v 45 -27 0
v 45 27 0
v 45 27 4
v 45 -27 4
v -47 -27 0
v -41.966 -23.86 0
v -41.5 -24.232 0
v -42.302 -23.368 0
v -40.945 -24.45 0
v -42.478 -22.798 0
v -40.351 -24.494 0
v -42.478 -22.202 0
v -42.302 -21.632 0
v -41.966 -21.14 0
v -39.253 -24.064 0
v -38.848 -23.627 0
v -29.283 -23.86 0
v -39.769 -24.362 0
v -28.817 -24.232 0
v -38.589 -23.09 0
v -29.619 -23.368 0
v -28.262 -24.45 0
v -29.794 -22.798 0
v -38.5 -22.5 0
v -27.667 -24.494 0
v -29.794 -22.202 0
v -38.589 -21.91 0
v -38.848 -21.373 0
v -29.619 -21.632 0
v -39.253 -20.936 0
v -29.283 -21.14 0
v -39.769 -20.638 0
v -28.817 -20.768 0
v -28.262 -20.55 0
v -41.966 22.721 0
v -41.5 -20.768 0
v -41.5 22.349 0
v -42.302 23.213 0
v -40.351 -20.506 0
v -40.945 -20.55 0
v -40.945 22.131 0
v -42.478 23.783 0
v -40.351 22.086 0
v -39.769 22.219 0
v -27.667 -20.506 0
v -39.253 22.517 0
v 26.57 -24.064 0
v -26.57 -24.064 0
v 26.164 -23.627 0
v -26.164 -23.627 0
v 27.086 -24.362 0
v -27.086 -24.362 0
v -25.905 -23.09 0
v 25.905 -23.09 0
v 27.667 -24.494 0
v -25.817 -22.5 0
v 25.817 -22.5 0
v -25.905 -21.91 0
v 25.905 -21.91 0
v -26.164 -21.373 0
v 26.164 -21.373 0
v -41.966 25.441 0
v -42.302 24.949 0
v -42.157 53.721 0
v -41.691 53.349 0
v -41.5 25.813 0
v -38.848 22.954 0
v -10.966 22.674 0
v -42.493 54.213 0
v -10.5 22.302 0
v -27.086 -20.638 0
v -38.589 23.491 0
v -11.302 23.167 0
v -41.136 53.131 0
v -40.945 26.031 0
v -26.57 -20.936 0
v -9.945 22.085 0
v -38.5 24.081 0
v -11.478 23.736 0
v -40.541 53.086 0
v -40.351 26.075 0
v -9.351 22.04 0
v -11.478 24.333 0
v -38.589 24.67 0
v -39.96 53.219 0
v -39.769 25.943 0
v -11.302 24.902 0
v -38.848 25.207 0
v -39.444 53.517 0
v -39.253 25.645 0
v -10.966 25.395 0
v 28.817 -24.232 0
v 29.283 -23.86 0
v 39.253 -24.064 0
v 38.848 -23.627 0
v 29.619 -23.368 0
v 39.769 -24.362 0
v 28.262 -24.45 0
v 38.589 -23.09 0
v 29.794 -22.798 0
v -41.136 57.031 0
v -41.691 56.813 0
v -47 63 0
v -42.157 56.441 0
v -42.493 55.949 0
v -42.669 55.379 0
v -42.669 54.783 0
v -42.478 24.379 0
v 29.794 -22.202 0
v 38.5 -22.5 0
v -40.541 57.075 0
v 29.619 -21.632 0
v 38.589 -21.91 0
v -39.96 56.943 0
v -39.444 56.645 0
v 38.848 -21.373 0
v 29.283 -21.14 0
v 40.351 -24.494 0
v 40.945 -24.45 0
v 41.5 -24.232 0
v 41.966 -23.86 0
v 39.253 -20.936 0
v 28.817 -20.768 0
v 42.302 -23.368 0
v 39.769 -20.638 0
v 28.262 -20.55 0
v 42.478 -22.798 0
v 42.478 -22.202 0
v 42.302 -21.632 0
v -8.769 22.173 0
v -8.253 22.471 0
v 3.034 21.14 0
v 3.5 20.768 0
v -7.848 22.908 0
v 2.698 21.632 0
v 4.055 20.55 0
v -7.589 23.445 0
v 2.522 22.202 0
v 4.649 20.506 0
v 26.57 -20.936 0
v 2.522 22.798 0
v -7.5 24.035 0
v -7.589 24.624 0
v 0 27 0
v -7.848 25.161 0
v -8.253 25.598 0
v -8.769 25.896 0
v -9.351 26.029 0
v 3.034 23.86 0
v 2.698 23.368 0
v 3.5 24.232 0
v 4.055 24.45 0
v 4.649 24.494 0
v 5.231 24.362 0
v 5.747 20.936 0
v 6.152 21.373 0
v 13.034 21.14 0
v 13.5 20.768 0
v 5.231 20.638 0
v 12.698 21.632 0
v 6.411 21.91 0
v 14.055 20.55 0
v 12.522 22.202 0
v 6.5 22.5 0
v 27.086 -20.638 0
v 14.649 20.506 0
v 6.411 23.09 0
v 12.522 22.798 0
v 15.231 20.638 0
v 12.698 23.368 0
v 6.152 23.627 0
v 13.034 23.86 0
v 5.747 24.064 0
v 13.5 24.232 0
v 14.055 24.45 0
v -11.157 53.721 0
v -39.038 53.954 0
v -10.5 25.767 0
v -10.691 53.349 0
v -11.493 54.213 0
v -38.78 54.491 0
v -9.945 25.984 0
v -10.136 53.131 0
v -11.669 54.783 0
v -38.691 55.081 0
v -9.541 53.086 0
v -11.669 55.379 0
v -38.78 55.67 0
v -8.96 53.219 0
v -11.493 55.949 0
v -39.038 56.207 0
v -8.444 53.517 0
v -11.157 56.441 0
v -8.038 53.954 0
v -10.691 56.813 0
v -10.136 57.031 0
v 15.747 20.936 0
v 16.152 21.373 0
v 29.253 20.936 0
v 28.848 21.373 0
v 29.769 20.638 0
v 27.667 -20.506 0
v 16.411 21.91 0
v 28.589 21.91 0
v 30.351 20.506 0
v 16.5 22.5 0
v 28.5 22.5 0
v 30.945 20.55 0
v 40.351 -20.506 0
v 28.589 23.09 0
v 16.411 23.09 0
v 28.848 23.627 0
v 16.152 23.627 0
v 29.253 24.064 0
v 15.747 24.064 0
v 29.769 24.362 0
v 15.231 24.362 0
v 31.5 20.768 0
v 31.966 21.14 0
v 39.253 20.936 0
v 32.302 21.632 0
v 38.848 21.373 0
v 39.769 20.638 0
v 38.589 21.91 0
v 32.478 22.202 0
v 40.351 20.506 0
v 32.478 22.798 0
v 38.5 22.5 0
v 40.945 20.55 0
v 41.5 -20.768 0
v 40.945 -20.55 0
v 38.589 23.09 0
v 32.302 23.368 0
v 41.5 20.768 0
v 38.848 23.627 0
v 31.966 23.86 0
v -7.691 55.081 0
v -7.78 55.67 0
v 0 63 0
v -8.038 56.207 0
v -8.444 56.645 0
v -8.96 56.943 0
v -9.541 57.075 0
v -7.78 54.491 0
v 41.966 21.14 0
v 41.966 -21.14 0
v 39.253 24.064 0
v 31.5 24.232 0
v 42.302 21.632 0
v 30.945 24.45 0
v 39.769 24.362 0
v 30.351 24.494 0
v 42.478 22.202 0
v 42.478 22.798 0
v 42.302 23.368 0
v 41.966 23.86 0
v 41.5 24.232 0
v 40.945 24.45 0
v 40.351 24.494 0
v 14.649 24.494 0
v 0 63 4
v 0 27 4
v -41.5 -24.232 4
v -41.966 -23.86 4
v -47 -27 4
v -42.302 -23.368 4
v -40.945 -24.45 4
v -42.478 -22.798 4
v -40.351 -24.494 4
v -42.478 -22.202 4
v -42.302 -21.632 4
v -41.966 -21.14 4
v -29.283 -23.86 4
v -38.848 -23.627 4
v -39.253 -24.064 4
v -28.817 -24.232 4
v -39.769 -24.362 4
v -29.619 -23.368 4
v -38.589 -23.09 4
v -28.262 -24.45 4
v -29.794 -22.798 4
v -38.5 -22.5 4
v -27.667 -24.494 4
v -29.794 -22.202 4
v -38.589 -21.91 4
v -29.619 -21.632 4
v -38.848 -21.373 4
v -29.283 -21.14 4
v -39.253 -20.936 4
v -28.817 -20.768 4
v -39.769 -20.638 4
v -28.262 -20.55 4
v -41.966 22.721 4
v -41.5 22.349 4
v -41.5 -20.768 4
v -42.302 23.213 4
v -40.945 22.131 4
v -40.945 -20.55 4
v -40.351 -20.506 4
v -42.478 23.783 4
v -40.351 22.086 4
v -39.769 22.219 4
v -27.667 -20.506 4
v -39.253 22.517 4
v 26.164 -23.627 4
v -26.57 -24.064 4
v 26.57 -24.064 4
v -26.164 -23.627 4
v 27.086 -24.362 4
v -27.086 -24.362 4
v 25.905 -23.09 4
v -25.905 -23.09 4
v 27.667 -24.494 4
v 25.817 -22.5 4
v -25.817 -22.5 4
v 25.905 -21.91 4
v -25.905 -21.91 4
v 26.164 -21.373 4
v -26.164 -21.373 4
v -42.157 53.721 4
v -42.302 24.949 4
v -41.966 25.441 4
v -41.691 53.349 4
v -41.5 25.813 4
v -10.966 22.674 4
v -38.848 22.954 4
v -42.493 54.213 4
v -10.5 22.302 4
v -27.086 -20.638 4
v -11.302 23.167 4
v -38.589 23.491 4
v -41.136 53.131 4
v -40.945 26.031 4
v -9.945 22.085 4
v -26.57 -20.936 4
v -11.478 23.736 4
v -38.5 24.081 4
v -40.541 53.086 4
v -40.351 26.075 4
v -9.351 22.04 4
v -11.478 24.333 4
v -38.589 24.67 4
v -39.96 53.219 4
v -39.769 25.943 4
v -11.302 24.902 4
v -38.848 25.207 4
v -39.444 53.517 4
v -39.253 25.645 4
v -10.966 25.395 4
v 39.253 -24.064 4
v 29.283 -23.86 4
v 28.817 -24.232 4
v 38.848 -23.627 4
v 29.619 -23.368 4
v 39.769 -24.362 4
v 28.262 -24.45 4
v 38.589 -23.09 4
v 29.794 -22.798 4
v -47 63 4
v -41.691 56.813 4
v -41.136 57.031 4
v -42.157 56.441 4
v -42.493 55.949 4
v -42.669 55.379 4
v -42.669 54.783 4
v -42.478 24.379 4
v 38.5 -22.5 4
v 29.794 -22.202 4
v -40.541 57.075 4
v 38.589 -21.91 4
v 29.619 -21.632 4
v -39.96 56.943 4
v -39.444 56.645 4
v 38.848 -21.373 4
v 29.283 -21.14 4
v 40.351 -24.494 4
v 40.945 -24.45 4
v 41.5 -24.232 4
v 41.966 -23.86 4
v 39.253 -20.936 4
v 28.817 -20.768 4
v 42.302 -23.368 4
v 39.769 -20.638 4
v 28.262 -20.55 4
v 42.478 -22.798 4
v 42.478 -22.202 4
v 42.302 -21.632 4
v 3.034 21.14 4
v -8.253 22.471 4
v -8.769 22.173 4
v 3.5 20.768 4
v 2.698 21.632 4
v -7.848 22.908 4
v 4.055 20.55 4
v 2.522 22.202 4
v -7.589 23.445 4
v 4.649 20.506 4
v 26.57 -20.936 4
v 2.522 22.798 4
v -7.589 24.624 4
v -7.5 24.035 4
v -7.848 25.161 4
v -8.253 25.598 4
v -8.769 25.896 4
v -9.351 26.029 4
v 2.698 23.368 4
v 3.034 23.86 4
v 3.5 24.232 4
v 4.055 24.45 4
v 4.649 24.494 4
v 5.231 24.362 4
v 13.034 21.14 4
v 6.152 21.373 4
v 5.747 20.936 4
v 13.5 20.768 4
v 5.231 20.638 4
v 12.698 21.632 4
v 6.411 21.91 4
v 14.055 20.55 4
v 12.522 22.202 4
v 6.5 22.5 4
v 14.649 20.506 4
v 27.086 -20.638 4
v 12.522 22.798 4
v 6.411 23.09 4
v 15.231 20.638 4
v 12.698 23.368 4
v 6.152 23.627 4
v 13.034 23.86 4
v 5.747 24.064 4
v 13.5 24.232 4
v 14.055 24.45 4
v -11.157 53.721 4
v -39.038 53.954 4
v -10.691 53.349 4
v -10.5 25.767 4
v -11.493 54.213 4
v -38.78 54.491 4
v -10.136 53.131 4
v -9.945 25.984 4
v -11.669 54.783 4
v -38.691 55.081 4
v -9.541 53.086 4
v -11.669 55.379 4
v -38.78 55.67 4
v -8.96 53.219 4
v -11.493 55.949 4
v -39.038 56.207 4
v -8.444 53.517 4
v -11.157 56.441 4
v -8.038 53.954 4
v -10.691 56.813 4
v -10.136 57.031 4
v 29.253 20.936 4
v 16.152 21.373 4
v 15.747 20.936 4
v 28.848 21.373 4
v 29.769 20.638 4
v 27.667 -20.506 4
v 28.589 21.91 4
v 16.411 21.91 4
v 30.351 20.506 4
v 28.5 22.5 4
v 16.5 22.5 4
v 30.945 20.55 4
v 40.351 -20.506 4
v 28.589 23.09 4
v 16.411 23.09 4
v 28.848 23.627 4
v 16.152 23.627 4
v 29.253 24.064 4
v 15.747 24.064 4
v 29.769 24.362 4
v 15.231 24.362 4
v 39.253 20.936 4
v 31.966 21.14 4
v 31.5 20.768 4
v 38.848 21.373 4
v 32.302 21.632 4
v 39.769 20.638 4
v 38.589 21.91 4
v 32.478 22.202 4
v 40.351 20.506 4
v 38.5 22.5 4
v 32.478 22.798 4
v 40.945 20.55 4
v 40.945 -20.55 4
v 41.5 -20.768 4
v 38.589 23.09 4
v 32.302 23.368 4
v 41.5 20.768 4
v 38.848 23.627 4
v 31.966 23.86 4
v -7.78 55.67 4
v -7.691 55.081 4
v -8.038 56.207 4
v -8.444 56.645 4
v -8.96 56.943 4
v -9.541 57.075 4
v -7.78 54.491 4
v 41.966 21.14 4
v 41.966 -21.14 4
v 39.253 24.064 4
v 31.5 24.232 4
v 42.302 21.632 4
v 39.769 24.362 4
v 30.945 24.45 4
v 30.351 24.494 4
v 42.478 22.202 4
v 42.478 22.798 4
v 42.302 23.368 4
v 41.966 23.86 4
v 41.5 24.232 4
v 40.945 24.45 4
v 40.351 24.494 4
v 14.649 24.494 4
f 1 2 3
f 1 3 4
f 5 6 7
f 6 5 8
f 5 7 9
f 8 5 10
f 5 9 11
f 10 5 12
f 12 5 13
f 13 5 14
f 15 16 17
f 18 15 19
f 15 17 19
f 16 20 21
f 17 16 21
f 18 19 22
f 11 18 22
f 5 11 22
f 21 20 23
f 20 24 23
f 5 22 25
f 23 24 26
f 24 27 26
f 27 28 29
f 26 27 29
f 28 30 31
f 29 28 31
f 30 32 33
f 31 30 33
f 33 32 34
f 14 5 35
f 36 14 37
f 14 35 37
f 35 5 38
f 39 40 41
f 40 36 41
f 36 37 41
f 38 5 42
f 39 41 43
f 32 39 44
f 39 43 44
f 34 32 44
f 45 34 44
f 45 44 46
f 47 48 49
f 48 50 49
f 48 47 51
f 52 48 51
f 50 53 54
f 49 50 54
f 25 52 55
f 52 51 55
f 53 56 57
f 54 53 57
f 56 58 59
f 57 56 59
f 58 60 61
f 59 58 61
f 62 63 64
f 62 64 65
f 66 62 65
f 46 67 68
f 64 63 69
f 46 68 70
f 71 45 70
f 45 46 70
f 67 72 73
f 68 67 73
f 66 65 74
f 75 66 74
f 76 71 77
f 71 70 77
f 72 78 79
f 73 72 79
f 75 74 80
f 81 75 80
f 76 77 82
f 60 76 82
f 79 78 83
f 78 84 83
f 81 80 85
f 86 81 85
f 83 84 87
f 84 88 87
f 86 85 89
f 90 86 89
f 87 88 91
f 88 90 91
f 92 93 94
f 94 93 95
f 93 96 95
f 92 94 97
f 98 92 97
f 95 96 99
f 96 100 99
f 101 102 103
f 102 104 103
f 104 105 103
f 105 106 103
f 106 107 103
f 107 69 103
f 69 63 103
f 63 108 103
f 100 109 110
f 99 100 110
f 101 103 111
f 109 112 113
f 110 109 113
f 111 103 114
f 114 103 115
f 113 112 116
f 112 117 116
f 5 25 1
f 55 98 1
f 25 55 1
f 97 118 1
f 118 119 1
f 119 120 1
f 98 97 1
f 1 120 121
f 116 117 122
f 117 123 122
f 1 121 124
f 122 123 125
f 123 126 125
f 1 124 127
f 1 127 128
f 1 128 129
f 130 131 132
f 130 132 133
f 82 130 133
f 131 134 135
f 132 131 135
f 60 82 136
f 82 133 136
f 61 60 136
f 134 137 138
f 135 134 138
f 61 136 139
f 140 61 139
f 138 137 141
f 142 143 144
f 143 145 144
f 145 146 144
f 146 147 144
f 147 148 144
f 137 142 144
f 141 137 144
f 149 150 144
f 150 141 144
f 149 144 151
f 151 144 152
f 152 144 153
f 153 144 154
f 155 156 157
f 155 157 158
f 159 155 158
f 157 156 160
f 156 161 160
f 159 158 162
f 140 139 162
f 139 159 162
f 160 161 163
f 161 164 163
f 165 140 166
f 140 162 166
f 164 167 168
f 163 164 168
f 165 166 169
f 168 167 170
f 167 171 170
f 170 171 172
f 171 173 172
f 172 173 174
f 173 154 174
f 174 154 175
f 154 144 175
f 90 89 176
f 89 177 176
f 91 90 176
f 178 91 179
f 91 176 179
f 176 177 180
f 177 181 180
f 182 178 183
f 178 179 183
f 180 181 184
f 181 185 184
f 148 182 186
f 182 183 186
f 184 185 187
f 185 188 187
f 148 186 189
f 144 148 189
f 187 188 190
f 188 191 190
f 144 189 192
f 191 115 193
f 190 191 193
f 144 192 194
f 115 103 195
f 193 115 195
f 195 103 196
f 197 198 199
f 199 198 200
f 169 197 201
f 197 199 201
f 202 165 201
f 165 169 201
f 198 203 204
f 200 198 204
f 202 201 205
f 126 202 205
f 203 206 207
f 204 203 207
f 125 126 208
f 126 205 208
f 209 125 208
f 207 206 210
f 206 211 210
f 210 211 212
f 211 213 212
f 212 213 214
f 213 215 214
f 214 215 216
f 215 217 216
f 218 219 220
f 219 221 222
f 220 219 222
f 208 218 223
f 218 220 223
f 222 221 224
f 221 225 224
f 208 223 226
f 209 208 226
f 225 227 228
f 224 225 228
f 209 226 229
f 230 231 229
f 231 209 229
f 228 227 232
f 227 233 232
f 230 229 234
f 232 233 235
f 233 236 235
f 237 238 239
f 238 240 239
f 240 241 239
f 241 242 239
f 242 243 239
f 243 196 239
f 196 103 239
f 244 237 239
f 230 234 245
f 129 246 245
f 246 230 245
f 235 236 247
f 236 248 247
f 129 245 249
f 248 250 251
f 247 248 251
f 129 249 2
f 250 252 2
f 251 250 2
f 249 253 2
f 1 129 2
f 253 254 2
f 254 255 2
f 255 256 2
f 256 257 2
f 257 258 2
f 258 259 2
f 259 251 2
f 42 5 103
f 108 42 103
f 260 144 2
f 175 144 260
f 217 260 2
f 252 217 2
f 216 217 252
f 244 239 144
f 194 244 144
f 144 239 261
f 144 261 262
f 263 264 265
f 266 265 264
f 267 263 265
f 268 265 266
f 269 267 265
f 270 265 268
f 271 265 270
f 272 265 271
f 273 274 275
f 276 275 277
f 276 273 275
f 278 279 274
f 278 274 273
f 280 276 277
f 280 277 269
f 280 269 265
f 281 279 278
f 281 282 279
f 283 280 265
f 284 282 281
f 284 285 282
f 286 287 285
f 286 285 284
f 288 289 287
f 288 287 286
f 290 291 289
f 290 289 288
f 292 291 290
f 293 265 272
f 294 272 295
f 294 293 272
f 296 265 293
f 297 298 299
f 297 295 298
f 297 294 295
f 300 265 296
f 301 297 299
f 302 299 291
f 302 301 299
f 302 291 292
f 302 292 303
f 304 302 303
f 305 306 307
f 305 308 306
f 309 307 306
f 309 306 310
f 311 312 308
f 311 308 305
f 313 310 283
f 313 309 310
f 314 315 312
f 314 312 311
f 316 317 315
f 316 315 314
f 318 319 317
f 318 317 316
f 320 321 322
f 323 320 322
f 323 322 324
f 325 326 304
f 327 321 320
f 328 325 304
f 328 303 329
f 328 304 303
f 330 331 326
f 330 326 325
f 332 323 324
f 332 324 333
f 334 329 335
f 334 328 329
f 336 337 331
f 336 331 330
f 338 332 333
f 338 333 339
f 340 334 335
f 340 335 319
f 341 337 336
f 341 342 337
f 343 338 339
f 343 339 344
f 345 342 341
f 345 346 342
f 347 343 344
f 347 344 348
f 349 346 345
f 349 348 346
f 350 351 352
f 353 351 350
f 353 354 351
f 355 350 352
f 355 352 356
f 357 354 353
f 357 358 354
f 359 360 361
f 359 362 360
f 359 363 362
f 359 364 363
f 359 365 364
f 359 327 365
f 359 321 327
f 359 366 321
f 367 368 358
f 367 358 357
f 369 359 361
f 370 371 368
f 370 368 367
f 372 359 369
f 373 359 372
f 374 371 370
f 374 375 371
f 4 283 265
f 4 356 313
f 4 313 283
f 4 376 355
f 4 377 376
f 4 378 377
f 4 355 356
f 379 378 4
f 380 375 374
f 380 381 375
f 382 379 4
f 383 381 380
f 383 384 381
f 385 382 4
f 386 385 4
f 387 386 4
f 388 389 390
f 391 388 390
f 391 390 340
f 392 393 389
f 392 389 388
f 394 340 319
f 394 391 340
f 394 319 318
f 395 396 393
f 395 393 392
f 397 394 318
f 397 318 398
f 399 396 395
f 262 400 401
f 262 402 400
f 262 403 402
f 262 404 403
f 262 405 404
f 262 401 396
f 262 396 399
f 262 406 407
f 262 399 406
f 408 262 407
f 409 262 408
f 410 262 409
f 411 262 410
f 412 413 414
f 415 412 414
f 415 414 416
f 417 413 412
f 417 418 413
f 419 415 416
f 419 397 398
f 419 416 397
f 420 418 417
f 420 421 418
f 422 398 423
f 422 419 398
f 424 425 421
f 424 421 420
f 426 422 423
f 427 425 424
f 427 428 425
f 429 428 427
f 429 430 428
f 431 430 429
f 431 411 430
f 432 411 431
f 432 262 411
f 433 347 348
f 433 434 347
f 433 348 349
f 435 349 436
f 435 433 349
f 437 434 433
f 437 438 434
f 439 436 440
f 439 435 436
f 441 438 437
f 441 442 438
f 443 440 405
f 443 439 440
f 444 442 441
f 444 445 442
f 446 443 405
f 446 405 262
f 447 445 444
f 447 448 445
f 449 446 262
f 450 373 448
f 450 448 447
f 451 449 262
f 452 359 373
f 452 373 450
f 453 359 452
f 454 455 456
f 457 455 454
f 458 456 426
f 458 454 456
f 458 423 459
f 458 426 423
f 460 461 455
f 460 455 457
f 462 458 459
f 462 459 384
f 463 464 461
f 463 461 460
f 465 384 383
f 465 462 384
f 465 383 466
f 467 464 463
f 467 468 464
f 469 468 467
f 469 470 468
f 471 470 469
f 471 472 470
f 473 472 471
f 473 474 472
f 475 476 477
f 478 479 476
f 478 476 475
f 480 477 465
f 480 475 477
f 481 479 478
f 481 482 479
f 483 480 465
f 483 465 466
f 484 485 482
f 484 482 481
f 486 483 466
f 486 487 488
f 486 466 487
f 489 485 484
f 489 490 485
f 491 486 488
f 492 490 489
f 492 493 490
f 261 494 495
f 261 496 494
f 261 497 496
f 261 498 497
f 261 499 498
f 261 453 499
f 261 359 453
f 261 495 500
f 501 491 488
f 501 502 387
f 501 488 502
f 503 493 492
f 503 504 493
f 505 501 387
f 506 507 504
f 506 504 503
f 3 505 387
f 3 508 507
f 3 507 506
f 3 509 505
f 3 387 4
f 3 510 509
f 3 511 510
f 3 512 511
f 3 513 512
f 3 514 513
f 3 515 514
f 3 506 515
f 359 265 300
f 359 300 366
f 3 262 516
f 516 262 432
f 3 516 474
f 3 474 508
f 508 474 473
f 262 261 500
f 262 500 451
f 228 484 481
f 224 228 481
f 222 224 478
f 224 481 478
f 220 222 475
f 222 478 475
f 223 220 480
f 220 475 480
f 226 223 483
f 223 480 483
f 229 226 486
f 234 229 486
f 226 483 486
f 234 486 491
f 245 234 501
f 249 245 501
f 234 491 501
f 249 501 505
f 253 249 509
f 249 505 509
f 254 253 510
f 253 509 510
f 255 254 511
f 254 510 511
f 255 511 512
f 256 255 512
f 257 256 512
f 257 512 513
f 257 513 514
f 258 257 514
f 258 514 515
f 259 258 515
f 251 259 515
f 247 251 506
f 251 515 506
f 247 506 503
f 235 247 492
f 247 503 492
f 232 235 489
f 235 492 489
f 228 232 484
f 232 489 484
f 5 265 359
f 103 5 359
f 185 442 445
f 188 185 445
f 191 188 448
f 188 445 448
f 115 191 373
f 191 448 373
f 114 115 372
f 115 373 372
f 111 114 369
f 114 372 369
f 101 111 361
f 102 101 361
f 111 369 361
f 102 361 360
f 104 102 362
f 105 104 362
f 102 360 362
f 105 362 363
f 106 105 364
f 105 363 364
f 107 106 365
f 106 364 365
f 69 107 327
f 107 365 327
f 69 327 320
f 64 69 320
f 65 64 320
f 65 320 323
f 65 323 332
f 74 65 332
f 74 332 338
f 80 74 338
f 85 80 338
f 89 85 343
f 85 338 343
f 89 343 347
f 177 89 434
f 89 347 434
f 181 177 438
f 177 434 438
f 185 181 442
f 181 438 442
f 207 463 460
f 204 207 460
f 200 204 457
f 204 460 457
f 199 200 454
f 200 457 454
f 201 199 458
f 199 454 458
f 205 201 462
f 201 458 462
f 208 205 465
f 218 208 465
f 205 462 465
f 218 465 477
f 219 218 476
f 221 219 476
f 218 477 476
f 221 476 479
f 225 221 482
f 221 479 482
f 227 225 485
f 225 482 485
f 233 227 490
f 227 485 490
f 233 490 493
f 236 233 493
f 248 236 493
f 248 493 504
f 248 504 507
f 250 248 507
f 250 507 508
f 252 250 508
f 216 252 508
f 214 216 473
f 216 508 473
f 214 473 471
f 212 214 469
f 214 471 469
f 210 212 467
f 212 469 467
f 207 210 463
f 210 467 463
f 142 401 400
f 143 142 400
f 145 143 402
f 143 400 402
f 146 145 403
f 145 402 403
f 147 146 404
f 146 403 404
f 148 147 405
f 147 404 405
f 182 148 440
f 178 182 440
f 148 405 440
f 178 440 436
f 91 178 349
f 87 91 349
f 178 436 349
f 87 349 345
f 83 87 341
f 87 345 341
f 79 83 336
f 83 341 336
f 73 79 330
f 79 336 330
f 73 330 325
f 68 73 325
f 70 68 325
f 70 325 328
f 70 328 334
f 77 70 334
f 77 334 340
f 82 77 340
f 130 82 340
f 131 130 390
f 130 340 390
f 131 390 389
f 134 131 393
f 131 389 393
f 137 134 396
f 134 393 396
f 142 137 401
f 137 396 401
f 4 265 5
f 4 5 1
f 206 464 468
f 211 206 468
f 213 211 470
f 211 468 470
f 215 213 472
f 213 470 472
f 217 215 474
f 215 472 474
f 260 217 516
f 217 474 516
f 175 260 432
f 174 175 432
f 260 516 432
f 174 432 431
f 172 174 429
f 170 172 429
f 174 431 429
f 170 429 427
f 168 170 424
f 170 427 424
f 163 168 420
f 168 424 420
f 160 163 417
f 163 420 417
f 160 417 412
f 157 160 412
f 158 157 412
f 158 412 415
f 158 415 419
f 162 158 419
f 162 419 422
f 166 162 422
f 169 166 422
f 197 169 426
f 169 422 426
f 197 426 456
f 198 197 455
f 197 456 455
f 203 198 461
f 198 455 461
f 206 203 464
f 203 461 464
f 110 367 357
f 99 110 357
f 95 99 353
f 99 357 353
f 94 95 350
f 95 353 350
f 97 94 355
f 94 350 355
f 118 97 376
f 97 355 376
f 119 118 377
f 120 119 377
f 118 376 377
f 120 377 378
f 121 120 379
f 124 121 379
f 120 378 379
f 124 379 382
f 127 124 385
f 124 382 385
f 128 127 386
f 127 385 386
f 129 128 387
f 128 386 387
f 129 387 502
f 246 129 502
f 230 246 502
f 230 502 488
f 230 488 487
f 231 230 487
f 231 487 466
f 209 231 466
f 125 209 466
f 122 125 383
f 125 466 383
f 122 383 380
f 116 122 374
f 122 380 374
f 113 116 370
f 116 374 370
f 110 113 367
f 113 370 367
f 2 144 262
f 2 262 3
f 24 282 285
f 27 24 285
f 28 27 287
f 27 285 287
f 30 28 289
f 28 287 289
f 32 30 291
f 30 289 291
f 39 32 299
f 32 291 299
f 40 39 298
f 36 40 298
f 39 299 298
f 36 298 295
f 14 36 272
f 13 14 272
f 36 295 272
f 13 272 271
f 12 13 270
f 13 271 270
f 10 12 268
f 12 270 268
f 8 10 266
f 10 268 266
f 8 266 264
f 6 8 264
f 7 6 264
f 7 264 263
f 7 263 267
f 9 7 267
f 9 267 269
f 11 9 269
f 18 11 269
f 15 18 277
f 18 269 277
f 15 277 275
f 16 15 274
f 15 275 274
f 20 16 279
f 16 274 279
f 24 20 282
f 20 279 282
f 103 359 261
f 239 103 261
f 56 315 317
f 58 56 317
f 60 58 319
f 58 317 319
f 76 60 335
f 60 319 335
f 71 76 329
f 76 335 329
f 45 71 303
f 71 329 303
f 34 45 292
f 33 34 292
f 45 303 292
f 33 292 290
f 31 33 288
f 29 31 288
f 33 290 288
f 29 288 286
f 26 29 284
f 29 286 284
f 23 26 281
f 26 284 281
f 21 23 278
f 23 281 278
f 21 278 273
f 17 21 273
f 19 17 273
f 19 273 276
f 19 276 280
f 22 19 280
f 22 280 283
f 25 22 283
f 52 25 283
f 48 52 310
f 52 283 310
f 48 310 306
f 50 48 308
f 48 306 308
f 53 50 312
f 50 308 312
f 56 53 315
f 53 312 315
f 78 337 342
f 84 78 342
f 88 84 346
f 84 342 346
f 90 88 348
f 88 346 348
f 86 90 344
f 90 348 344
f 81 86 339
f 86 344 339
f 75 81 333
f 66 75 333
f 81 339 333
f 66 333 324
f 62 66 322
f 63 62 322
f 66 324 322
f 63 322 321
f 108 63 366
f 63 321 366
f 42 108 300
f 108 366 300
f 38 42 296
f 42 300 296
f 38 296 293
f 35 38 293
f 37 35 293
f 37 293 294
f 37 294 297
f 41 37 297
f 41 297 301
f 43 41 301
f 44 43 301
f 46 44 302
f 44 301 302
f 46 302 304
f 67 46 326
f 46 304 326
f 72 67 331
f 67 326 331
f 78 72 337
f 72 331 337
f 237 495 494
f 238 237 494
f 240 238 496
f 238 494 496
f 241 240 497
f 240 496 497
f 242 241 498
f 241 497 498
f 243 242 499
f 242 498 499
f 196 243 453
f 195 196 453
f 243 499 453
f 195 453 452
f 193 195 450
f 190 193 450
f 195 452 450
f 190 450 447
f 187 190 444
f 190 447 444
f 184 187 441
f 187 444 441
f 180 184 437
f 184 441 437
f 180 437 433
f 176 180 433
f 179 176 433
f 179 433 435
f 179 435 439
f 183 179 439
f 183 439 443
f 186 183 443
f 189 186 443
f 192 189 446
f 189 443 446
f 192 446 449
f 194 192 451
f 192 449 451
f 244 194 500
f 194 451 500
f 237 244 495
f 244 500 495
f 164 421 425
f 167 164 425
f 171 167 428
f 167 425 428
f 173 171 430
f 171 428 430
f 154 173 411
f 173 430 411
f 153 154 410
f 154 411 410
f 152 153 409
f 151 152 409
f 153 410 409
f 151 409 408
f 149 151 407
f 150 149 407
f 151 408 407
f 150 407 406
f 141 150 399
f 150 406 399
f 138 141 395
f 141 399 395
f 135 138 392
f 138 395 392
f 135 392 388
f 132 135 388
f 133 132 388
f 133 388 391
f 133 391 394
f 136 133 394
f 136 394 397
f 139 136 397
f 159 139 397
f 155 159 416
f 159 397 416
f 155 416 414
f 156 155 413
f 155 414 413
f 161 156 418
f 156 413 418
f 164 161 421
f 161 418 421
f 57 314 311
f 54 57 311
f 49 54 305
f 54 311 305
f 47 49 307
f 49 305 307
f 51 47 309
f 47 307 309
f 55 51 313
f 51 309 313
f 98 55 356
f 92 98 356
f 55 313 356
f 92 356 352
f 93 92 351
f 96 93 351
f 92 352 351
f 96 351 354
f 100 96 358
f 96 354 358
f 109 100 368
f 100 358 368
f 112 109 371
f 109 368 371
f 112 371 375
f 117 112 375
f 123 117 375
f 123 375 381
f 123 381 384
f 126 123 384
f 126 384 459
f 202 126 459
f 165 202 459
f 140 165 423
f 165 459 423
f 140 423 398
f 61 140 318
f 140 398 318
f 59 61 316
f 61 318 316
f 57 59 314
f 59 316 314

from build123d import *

# Parameters (mm, degrees)
BOSS_EXTRUDE1_DEPTH = 4
SKETCH2_R           = 2
CUT_EXTRUDE1_DEPTH  = 4
SKETCH3_R           = 2
CUT_EXTRUDE2_DEPTH  = 4
SKETCH4_R           = 2
CUT_EXTRUDE3_DEPTH  = 4
SKETCH5_W           = 2
SKETCH5_H           = 90
BOSS_EXTRUDE2_DEPTH = 4
SKETCH6_R           = 2
CUT_EXTRUDE4_DEPTH  = 4


with BuildPart() as part:
    # Sketch1 → Boss-Extrude1 (new body)
    with BuildSketch(Plane.XY):
        Polygon((-45, 27), (-45, 63), (0, 63), (0, 27), (45, 27), (45, -27), (-45, -27), align=None)
    extrude(amount=BOSS_EXTRUDE1_DEPTH)

    # Sketch2 → Cut-Extrude1 (cut)
    with BuildSketch(Plane.XY.offset(4)):
        with Locations((-40.5, -22.5)):
            Circle(SKETCH2_R)
        with Locations((-27.816637329, -22.5)):
            Circle(SKETCH2_R)
        with Locations(Location((27.816637329, -22.5, 0), (0, 0, 180))):
            Circle(SKETCH2_R)
        with Locations(Location((40.5, -22.5, 0), (0, 0, 180))):
            Circle(SKETCH2_R)
        with Locations(Location((30.5, 22.5, 0), (0, 0, 180))):
            Circle(SKETCH2_R)
        with Locations(Location((40.5, 22.5, 0), (0, 0, 180))):
            Circle(SKETCH2_R)
    extrude(amount=-CUT_EXTRUDE1_DEPTH, mode=Mode.SUBTRACT)

    # Sketch3 → Cut-Extrude2 (cut)
    with BuildSketch(Plane.XY.offset(4)):
        with Locations((-40.5, 24.080850084)):
            Circle(SKETCH3_R)
        with Locations((-9.500034607, 24.034529107)):
            Circle(SKETCH3_R)
    extrude(amount=-CUT_EXTRUDE2_DEPTH, mode=Mode.SUBTRACT)

    # Sketch4 → Cut-Extrude3 (cut)
    with BuildSketch(Plane.XY.offset(4)):
        with Locations((-40.690838772, 55.080850084)):
            Circle(SKETCH4_R)
        with Locations((-9.690838772, 55.080850084)):
            Circle(SKETCH4_R)
    extrude(amount=-CUT_EXTRUDE3_DEPTH, mode=Mode.SUBTRACT)

    # Sketch5 → Boss-Extrude2 (add)
    with BuildSketch(Plane.XY.offset(4)):
        with Locations((-46, 18)):
            Rectangle(SKETCH5_W, SKETCH5_H)
    extrude(amount=-BOSS_EXTRUDE2_DEPTH)

    # Sketch6 → Cut-Extrude4 (cut)
    with BuildSketch(Plane.XY.offset(4)):
        with Locations((4.5, 22.5)):
            Circle(SKETCH6_R)
        with Locations((14.5, 22.5)):
            Circle(SKETCH6_R)
    extrude(amount=-CUT_EXTRUDE4_DEPTH, mode=Mode.SUBTRACT)


solid = part.part
